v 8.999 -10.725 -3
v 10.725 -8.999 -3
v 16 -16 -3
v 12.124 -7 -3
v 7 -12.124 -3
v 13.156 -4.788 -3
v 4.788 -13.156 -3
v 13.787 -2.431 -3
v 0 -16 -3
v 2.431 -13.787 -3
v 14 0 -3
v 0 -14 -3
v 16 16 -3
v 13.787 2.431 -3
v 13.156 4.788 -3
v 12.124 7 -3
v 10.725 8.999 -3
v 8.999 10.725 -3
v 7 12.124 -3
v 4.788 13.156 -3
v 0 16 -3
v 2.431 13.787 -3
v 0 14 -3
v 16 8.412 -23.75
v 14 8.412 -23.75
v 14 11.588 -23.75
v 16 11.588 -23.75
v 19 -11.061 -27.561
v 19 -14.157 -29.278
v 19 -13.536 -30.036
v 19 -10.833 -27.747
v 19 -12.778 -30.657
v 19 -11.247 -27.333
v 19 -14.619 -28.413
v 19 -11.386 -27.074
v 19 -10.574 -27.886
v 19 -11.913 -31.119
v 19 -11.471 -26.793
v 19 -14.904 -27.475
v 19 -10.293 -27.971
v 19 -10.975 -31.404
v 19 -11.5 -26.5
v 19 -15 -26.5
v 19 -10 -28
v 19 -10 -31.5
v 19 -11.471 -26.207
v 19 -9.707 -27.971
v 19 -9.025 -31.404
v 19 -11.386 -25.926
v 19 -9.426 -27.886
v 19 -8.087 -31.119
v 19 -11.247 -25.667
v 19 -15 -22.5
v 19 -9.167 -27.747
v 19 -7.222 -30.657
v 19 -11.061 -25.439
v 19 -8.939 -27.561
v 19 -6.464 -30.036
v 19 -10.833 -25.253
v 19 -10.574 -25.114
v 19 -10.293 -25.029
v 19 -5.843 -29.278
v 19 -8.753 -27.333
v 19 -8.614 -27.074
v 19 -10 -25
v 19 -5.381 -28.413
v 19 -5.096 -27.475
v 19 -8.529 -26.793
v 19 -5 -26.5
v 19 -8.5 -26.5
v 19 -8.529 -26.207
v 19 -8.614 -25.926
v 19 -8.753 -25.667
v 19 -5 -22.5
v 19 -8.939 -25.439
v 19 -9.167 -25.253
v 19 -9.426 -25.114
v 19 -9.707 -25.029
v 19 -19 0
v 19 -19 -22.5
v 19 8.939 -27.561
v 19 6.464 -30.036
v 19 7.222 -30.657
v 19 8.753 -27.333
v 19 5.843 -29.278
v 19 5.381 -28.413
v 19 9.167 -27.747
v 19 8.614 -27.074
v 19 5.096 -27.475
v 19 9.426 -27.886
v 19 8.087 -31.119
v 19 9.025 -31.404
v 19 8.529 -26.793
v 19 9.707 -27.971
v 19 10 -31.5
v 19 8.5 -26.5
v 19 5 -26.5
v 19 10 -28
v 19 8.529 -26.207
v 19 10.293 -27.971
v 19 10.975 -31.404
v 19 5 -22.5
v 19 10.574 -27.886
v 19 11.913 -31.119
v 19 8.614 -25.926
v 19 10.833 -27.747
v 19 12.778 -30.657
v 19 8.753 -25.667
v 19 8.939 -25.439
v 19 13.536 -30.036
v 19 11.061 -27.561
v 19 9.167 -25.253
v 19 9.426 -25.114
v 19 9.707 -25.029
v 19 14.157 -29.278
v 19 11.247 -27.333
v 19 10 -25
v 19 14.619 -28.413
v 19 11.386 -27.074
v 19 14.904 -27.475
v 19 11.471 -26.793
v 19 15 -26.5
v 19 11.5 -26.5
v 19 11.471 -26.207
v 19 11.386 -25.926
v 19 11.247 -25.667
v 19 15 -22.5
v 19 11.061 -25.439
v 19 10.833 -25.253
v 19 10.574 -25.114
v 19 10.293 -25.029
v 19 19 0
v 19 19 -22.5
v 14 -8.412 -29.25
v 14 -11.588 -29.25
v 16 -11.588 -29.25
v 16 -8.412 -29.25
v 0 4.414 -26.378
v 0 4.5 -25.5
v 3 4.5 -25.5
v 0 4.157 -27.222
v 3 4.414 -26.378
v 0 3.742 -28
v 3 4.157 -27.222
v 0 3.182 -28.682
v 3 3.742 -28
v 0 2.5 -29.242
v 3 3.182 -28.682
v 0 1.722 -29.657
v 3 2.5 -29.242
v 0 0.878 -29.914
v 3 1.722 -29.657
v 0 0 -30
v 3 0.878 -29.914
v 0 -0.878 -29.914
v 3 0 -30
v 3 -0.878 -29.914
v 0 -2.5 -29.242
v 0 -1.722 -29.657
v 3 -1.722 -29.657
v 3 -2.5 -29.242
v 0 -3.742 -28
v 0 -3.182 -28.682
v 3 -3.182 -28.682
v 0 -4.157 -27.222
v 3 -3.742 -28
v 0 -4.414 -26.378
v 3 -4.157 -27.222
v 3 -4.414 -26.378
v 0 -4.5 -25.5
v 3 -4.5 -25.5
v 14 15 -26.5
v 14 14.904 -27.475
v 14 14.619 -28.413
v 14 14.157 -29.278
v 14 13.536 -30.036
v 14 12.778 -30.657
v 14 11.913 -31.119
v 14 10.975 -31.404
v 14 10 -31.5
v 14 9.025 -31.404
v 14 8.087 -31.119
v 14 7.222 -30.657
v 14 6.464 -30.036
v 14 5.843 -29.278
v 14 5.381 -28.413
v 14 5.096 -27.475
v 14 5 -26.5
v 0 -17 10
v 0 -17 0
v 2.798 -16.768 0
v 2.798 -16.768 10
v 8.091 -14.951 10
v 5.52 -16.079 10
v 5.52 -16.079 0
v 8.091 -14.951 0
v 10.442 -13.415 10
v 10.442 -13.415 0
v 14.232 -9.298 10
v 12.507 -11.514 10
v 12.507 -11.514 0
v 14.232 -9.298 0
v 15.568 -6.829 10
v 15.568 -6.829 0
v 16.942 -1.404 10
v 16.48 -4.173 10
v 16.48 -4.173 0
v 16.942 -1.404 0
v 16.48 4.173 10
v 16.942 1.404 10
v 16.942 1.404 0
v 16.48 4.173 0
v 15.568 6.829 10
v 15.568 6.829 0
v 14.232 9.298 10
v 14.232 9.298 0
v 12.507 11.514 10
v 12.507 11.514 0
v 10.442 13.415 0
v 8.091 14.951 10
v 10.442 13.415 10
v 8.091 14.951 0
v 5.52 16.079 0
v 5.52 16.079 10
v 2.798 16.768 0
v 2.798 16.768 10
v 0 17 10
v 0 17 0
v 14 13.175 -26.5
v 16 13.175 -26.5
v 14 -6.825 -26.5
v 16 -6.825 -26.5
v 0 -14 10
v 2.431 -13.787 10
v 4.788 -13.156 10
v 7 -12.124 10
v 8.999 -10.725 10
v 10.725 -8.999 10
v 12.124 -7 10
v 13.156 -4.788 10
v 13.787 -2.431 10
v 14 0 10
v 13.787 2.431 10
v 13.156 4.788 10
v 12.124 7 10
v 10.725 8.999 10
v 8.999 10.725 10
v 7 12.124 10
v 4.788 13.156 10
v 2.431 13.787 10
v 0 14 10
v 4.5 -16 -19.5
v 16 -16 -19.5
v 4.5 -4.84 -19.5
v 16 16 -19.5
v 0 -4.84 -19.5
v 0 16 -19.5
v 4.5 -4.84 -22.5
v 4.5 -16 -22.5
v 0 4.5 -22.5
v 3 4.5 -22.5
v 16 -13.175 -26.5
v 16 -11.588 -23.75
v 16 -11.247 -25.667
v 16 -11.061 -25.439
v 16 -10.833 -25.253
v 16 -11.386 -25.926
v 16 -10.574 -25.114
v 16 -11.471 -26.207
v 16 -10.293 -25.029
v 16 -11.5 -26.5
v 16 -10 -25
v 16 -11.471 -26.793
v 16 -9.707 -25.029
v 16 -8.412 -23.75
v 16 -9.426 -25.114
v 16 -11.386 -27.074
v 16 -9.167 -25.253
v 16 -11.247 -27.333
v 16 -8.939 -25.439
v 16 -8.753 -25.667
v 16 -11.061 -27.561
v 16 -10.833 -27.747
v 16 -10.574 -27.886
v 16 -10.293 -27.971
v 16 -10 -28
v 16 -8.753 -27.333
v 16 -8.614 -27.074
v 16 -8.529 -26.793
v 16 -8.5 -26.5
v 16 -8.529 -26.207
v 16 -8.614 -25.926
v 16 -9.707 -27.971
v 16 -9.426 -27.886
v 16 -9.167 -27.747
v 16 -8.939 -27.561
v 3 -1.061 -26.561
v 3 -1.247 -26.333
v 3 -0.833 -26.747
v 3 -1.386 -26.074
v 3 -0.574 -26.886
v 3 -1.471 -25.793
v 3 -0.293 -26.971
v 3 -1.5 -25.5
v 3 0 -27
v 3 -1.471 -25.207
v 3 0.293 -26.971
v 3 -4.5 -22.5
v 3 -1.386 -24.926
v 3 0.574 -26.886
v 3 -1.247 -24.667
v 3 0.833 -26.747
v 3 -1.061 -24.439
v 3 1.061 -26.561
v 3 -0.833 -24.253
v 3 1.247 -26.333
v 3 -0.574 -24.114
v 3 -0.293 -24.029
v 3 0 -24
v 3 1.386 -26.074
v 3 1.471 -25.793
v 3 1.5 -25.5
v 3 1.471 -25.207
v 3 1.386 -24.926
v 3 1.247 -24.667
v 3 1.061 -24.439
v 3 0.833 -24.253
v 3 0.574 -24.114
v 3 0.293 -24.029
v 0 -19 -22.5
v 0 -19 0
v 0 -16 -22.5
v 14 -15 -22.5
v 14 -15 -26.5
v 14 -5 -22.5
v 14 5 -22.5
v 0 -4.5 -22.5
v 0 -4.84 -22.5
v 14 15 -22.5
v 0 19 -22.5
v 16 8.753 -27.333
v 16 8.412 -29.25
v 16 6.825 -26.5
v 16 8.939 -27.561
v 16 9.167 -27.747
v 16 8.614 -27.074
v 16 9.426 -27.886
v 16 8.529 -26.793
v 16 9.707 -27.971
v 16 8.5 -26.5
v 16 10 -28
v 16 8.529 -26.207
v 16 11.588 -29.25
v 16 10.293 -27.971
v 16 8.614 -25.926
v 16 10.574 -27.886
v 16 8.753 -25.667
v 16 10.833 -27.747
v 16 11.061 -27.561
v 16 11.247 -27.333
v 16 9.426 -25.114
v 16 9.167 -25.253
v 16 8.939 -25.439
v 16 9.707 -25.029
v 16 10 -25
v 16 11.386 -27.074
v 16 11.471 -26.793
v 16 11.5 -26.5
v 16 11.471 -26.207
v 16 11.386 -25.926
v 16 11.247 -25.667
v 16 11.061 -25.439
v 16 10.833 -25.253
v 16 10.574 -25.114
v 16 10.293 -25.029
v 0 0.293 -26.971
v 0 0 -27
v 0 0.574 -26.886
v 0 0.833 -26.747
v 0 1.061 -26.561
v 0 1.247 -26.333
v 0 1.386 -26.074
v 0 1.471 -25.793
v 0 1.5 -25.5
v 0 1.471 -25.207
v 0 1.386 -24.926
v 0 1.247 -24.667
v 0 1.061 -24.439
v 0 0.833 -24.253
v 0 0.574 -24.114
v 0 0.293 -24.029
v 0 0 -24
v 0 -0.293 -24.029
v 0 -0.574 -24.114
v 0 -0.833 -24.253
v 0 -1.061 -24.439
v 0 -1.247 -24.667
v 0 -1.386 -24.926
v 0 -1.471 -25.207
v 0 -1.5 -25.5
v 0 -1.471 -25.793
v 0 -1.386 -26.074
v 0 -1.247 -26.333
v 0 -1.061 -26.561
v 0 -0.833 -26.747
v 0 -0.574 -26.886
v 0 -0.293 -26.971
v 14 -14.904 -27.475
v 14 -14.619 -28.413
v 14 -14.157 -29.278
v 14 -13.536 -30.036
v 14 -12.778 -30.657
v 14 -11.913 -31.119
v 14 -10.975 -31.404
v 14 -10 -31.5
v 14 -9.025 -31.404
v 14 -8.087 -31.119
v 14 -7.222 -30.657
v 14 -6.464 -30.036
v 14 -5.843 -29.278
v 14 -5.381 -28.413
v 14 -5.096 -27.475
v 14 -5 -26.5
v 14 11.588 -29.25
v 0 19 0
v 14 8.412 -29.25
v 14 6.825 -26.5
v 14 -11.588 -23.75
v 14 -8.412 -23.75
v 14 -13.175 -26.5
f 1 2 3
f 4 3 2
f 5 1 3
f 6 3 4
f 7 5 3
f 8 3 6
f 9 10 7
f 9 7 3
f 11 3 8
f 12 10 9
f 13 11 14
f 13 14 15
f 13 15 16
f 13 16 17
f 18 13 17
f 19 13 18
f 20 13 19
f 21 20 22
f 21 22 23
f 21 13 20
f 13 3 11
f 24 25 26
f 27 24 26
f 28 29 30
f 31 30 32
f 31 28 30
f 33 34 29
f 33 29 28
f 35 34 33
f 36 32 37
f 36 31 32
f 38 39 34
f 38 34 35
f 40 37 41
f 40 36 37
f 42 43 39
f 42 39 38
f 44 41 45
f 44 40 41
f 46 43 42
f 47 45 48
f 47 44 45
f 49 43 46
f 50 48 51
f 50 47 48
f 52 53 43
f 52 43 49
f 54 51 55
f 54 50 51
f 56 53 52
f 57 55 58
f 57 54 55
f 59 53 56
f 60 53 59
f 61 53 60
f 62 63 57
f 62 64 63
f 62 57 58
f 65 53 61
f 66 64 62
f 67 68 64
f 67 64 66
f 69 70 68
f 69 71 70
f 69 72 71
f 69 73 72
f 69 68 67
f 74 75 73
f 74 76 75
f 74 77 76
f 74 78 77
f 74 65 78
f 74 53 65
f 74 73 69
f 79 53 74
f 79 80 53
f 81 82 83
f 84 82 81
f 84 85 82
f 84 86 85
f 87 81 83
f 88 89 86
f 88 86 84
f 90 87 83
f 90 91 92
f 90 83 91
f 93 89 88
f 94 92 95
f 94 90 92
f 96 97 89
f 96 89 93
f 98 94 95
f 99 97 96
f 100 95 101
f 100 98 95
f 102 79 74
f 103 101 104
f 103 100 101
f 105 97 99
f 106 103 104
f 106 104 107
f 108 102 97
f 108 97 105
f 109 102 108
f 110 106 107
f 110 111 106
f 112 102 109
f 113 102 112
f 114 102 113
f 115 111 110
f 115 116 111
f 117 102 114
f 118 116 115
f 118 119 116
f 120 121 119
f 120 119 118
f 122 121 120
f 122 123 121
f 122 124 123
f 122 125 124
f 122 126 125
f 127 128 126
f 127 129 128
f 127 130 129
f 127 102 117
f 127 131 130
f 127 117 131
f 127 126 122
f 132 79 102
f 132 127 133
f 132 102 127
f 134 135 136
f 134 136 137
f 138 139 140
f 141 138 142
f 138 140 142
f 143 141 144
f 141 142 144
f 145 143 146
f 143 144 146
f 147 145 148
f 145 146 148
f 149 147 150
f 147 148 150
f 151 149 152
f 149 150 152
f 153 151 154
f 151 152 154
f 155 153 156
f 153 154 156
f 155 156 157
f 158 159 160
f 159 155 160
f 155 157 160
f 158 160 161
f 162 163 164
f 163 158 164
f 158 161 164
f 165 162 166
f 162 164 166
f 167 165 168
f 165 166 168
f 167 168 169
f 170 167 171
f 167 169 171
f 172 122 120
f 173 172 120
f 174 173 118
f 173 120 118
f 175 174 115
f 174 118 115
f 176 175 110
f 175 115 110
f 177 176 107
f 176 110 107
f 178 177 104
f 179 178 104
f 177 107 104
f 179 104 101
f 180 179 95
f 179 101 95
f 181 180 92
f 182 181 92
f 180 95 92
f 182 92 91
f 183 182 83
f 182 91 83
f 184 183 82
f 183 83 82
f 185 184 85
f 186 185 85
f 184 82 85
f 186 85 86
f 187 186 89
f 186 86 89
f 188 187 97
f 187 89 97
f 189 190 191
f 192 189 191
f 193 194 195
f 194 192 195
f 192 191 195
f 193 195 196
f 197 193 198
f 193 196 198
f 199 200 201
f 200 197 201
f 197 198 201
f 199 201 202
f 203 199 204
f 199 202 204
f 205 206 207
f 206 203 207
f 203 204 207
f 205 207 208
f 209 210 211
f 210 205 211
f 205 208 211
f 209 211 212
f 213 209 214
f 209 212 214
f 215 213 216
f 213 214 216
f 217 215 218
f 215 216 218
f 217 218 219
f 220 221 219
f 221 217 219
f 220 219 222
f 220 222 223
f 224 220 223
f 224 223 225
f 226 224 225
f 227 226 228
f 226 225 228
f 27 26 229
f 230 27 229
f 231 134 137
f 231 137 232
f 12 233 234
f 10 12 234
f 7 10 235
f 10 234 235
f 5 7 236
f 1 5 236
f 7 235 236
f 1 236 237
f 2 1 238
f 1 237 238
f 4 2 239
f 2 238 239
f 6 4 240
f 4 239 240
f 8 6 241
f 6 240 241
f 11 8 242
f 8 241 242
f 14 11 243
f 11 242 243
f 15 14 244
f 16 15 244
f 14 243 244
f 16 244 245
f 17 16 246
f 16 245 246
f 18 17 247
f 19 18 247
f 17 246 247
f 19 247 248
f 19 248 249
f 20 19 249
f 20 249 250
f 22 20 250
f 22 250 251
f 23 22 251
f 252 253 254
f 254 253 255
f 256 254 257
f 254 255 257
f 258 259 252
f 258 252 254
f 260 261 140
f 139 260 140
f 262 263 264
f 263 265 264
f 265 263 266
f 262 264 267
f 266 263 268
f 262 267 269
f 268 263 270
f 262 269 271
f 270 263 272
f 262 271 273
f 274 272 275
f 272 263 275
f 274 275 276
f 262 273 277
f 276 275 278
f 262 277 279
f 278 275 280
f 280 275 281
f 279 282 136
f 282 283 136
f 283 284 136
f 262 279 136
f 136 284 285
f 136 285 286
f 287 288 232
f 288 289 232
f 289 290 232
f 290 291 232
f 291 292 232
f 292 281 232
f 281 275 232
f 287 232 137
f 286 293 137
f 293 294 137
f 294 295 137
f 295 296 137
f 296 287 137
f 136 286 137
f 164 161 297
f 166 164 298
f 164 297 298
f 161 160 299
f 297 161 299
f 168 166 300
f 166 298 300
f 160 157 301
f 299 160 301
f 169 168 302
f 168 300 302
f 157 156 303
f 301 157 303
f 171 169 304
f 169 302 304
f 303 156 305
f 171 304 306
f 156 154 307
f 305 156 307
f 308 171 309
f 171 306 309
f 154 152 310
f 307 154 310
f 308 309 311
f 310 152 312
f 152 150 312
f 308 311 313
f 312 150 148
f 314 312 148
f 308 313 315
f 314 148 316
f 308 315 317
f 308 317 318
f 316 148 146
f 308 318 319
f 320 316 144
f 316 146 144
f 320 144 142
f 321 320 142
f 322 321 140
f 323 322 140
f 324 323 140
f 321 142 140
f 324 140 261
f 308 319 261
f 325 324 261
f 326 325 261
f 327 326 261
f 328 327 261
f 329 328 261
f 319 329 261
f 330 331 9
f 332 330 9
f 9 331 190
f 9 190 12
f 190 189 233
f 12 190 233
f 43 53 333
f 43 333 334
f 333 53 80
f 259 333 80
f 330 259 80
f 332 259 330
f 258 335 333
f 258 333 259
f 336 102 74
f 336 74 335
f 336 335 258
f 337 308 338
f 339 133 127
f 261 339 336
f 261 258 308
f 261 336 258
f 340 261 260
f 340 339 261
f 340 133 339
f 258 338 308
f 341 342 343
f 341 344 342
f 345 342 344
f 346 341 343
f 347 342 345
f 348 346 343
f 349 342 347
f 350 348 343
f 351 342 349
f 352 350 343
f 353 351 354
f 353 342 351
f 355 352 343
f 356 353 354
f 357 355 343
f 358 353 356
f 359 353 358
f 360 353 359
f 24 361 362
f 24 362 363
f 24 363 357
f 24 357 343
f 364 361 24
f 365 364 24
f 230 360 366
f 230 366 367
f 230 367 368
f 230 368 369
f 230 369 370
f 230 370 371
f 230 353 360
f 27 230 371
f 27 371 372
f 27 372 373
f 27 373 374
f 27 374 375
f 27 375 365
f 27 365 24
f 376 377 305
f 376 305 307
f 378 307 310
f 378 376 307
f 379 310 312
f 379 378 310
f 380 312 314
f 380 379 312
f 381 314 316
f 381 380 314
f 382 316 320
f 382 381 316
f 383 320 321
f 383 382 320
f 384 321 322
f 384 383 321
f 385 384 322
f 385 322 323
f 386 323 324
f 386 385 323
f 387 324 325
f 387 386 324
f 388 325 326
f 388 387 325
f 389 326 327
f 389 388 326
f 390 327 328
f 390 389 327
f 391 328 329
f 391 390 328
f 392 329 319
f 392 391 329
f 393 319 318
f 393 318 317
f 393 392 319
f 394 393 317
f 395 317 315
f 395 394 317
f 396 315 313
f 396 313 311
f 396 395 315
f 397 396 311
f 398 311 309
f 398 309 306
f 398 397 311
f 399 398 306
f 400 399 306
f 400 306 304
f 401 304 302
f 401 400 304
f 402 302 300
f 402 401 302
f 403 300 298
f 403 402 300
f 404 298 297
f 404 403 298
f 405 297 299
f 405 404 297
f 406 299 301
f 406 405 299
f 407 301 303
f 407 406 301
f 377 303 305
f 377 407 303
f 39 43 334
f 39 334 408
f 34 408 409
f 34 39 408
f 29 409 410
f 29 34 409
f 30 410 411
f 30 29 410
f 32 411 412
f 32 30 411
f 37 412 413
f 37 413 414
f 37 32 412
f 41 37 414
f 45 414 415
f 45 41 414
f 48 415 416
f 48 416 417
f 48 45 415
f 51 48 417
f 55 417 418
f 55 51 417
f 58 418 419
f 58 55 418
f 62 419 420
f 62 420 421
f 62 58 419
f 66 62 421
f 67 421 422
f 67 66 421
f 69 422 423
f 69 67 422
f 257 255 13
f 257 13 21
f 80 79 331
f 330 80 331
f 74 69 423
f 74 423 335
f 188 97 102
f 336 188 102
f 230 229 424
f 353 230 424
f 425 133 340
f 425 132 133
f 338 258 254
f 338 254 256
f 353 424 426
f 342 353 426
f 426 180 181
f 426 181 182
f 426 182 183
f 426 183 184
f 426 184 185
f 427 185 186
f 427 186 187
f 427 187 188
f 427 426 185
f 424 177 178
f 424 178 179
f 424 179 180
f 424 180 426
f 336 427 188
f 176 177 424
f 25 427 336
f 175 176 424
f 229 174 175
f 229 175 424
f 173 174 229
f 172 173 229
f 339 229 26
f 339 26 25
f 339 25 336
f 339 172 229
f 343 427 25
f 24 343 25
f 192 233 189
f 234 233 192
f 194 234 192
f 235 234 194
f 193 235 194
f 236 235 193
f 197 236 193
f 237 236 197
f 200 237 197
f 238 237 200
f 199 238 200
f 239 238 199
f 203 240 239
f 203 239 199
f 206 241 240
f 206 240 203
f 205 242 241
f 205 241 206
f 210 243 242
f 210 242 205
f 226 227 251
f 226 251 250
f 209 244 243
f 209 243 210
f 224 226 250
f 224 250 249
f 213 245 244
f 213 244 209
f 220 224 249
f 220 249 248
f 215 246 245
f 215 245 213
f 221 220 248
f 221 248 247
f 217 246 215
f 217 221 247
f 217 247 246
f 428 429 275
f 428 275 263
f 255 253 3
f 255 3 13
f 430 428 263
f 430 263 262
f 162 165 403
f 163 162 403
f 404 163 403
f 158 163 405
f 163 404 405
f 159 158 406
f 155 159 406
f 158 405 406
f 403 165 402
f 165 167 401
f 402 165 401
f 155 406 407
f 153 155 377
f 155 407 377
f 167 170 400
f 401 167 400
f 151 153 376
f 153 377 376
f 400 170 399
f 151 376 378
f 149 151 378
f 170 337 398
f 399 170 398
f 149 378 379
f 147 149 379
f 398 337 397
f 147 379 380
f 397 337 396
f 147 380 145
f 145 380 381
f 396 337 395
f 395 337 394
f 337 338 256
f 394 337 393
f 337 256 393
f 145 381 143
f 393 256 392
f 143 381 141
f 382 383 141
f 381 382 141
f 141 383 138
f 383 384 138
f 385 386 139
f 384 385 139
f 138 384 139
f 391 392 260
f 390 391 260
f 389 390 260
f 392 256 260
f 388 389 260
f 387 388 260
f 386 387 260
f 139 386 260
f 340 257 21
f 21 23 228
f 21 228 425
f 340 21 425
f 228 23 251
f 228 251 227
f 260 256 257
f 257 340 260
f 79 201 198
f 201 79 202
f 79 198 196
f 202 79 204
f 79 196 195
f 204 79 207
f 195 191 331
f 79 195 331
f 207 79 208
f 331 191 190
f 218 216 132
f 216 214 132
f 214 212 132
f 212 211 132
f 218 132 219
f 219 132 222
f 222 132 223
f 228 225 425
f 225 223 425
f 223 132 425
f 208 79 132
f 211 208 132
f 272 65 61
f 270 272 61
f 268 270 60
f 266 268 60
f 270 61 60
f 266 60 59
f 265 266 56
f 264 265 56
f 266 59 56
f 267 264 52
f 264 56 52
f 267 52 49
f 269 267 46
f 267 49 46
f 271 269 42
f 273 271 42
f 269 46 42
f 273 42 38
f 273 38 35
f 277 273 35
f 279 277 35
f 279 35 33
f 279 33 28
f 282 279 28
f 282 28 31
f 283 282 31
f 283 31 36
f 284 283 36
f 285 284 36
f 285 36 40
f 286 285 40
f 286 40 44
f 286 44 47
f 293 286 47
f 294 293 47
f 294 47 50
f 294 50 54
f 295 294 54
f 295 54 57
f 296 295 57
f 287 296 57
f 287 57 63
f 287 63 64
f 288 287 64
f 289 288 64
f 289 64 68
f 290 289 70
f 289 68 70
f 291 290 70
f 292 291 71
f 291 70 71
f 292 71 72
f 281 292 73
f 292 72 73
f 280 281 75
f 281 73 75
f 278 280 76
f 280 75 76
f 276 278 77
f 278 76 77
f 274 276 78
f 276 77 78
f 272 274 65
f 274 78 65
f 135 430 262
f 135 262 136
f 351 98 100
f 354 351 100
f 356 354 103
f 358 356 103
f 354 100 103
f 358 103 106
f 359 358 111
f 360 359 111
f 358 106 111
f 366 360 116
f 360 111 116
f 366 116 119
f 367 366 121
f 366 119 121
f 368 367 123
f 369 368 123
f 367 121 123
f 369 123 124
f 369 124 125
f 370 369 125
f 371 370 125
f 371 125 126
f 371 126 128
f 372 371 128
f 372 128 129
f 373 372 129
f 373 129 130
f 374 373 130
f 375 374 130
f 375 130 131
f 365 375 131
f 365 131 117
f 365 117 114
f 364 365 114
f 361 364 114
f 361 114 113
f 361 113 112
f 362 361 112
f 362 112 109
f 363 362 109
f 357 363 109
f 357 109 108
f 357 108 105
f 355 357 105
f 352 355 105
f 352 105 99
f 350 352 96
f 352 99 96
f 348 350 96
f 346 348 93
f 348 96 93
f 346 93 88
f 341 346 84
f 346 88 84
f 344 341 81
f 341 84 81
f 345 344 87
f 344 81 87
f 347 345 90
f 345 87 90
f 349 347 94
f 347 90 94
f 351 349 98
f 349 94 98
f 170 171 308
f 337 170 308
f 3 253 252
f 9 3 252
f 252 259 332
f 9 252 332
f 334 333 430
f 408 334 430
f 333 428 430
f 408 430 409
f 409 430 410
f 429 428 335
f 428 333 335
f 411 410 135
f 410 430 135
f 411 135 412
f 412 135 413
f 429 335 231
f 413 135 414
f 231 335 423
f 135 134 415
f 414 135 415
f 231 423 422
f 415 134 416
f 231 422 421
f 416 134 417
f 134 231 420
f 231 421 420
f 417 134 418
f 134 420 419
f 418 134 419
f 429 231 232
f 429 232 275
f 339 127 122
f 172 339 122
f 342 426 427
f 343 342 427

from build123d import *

# Parameters (mm, degrees)
SKETCH_1_R               = 17
SKETCH_1_R_2             = 14
EXTRUDE_1_DEPTH          = 10
SKETCH_2_W               = 38
SKETCH_2_H               = 38
EXTRUDE_2_DEPTH          = 22.5
SKETCH_3_W               = 32
SKETCH_3_H               = 32
CUT_EXTRUDE_1_DEPTH      = 19.5
SKETCH_4_R               = 14
CUT_EXTRUDE_2_DEPTH      = 36.046397818
SKETCH_5_W               = 38
SKETCH_5_H               = 38
SKETCH_5_W_2             = 12.1
SKETCH_5_H_2             = 11.16
EXTRUDE_3_DEPTH          = 3
SKETCH_6_R               = 1.5
EXTRUDE_4_DEPTH          = 3
SKETCH_7_R               = 1.5
EXTRUDE_5_DEPTH          = 5
CUT_EXTRUDE_3_DEPTH      = 2
CUT_EXTRUDE_5_DEPTH      = 43.16930163
CUT_EXTRUDE_5_DEPTH_BACK = 43.16930163
SKETCH_9_W               = 31.856814276
SKETCH_9_H               = 55.588041179


with BuildPart() as part:
    # 草图1 → 凸台-拉伸1 (new body)
    with BuildSketch(Plane.XY):
        Circle(SKETCH_1_R)
        Circle(SKETCH_1_R_2, mode=Mode.SUBTRACT)
    extrude(amount=EXTRUDE_1_DEPTH)

    # 草图2 → 凸台-拉伸2 (add)
    with BuildSketch(Plane(origin=(0, 0, 0), x_dir=(-1, 0, 0), z_dir=(0, 0, -1))):
        Rectangle(SKETCH_2_W, SKETCH_2_H)
    extrude(amount=EXTRUDE_2_DEPTH)

    # 草图3 → 切除-拉伸1 (cut)
    with BuildSketch(Plane(origin=(0, 0, -22.5), x_dir=(-1, 0, 0), z_dir=(0, 0, -1))):
        Rectangle(SKETCH_3_W, SKETCH_3_H)
    extrude(amount=-CUT_EXTRUDE_1_DEPTH, mode=Mode.SUBTRACT)

    # 草图4 → 切除-拉伸2 (cut, through all)
    with BuildSketch(Plane.XY):
        Circle(SKETCH_4_R)
    extrude(amount=-CUT_EXTRUDE_2_DEPTH, mode=Mode.SUBTRACT)

    # 草图5 → 凸台-拉伸3 (add)
    with BuildSketch(Plane(origin=(0, 0, -22.5), x_dir=(-1, 0, 0), z_dir=(0, 0, -1))):
        Rectangle(SKETCH_5_W, SKETCH_5_H)
        with Locations((1.55, -10.42)):
            Rectangle(SKETCH_5_W_2, SKETCH_5_H_2, mode=Mode.SUBTRACT)
    extrude(amount=-EXTRUDE_3_DEPTH)

    # 草图6 → 凸台-拉伸4 (add, symmetric)
    with BuildSketch(Plane(origin=(0, 0, 0), x_dir=(0, 0, -1), z_dir=(1, 0, 0))):
        with BuildLine():
            Line((22.5, 4.5), (25.5, 4.5))
            ThreePointArc((25.5, 4.5), (30, 0), (25.5, -4.5))
            Line((25.5, -4.5), (22.5, -4.5))
            Line((22.5, -4.5), (22.5, 4.5))
        make_face()
        with Locations((25.5, 0)):
            Circle(SKETCH_6_R, mode=Mode.SUBTRACT)
    extrude(amount=EXTRUDE_4_DEPTH, both=True)

    # 草图7 → 凸台-拉伸5 (add)
    # profile 1 of 2: a face of its own
    with BuildSketch(Plane(origin=(19, 0, 0), x_dir=(0, 0, -1), z_dir=(1, 0, 0))):
        with BuildLine():
            Line((22.5, 15), (26.5, 15))
            ThreePointArc((26.5, 15), (31.5, 10), (26.5, 5))
            Line((26.5, 5), (22.5, 5))
            Line((22.5, 5), (22.5, 15))
        make_face()
        with Locations((26.5, 10)):
            Circle(SKETCH_7_R, mode=Mode.SUBTRACT)
    # profile 2 of 2: a face of its own
    with BuildSketch(Plane(origin=(19, 0, 0), x_dir=(0, 0, -1), z_dir=(1, 0, 0))):
        with BuildLine():
            Line((22.5, -5), (22.5, -15))
            Line((22.5, -15), (26.5, -15))
            ThreePointArc((26.5, -15), (31.5, -10), (26.5, -5))
            Line((26.5, -5), (22.5, -5))
        make_face()
        with Locations(Location((26.5, -10, 0), (0, 0, 180))):
            Circle(SKETCH_7_R, mode=Mode.SUBTRACT)
    extrude_5 = extrude(amount=-EXTRUDE_5_DEPTH)

    # 草图8 → 切除-拉伸3 (cut)
    with BuildSketch(Plane.ZY.offset(-14)):
        Polygon((-26.5, 6.824573519), (-23.75, 8.41228676), (-23.75, 11.58771324), (-26.5, 13.175426481), (-29.25, 11.58771324), (-29.25, 8.41228676), align=None)
        Polygon((-29.25, -8.41228676), (-26.5, -6.824573519), (-23.75, -8.41228676), (-23.75, -11.58771324), (-26.5, -13.175426481), (-29.25, -11.58771324), align=None)
    cut_extrude_3 = extrude(amount=-CUT_EXTRUDE_3_DEPTH, mode=Mode.SUBTRACT)

    # 镜向1: 凸台-拉伸5, 切除-拉伸3 across plane
    add(extrude_5.mirror(Plane(origin=(0, 0, 0), x_dir=(0, 0, 1), z_dir=(1, 0, 0))))
    add(cut_extrude_3.mirror(Plane(origin=(0, 0, 0), x_dir=(0, 0, 1), z_dir=(1, 0, 0))), mode=Mode.SUBTRACT)

    # 草图9 → 切除-拉伸5 (cut, two sides: drawn at the far end of the back side and taken through both)
    with BuildSketch(Plane(origin=(0, 0, -22.5), x_dir=(-1, 0, 0), z_dir=(0, 0, -1)).offset(-CUT_EXTRUDE_5_DEPTH_BACK)):
        with Locations((15.928407138, -0.196580563)):
            Rectangle(SKETCH_9_W, SKETCH_9_H)
    extrude(amount=CUT_EXTRUDE_5_DEPTH + CUT_EXTRUDE_5_DEPTH_BACK, mode=Mode.SUBTRACT)


solid = part.part
